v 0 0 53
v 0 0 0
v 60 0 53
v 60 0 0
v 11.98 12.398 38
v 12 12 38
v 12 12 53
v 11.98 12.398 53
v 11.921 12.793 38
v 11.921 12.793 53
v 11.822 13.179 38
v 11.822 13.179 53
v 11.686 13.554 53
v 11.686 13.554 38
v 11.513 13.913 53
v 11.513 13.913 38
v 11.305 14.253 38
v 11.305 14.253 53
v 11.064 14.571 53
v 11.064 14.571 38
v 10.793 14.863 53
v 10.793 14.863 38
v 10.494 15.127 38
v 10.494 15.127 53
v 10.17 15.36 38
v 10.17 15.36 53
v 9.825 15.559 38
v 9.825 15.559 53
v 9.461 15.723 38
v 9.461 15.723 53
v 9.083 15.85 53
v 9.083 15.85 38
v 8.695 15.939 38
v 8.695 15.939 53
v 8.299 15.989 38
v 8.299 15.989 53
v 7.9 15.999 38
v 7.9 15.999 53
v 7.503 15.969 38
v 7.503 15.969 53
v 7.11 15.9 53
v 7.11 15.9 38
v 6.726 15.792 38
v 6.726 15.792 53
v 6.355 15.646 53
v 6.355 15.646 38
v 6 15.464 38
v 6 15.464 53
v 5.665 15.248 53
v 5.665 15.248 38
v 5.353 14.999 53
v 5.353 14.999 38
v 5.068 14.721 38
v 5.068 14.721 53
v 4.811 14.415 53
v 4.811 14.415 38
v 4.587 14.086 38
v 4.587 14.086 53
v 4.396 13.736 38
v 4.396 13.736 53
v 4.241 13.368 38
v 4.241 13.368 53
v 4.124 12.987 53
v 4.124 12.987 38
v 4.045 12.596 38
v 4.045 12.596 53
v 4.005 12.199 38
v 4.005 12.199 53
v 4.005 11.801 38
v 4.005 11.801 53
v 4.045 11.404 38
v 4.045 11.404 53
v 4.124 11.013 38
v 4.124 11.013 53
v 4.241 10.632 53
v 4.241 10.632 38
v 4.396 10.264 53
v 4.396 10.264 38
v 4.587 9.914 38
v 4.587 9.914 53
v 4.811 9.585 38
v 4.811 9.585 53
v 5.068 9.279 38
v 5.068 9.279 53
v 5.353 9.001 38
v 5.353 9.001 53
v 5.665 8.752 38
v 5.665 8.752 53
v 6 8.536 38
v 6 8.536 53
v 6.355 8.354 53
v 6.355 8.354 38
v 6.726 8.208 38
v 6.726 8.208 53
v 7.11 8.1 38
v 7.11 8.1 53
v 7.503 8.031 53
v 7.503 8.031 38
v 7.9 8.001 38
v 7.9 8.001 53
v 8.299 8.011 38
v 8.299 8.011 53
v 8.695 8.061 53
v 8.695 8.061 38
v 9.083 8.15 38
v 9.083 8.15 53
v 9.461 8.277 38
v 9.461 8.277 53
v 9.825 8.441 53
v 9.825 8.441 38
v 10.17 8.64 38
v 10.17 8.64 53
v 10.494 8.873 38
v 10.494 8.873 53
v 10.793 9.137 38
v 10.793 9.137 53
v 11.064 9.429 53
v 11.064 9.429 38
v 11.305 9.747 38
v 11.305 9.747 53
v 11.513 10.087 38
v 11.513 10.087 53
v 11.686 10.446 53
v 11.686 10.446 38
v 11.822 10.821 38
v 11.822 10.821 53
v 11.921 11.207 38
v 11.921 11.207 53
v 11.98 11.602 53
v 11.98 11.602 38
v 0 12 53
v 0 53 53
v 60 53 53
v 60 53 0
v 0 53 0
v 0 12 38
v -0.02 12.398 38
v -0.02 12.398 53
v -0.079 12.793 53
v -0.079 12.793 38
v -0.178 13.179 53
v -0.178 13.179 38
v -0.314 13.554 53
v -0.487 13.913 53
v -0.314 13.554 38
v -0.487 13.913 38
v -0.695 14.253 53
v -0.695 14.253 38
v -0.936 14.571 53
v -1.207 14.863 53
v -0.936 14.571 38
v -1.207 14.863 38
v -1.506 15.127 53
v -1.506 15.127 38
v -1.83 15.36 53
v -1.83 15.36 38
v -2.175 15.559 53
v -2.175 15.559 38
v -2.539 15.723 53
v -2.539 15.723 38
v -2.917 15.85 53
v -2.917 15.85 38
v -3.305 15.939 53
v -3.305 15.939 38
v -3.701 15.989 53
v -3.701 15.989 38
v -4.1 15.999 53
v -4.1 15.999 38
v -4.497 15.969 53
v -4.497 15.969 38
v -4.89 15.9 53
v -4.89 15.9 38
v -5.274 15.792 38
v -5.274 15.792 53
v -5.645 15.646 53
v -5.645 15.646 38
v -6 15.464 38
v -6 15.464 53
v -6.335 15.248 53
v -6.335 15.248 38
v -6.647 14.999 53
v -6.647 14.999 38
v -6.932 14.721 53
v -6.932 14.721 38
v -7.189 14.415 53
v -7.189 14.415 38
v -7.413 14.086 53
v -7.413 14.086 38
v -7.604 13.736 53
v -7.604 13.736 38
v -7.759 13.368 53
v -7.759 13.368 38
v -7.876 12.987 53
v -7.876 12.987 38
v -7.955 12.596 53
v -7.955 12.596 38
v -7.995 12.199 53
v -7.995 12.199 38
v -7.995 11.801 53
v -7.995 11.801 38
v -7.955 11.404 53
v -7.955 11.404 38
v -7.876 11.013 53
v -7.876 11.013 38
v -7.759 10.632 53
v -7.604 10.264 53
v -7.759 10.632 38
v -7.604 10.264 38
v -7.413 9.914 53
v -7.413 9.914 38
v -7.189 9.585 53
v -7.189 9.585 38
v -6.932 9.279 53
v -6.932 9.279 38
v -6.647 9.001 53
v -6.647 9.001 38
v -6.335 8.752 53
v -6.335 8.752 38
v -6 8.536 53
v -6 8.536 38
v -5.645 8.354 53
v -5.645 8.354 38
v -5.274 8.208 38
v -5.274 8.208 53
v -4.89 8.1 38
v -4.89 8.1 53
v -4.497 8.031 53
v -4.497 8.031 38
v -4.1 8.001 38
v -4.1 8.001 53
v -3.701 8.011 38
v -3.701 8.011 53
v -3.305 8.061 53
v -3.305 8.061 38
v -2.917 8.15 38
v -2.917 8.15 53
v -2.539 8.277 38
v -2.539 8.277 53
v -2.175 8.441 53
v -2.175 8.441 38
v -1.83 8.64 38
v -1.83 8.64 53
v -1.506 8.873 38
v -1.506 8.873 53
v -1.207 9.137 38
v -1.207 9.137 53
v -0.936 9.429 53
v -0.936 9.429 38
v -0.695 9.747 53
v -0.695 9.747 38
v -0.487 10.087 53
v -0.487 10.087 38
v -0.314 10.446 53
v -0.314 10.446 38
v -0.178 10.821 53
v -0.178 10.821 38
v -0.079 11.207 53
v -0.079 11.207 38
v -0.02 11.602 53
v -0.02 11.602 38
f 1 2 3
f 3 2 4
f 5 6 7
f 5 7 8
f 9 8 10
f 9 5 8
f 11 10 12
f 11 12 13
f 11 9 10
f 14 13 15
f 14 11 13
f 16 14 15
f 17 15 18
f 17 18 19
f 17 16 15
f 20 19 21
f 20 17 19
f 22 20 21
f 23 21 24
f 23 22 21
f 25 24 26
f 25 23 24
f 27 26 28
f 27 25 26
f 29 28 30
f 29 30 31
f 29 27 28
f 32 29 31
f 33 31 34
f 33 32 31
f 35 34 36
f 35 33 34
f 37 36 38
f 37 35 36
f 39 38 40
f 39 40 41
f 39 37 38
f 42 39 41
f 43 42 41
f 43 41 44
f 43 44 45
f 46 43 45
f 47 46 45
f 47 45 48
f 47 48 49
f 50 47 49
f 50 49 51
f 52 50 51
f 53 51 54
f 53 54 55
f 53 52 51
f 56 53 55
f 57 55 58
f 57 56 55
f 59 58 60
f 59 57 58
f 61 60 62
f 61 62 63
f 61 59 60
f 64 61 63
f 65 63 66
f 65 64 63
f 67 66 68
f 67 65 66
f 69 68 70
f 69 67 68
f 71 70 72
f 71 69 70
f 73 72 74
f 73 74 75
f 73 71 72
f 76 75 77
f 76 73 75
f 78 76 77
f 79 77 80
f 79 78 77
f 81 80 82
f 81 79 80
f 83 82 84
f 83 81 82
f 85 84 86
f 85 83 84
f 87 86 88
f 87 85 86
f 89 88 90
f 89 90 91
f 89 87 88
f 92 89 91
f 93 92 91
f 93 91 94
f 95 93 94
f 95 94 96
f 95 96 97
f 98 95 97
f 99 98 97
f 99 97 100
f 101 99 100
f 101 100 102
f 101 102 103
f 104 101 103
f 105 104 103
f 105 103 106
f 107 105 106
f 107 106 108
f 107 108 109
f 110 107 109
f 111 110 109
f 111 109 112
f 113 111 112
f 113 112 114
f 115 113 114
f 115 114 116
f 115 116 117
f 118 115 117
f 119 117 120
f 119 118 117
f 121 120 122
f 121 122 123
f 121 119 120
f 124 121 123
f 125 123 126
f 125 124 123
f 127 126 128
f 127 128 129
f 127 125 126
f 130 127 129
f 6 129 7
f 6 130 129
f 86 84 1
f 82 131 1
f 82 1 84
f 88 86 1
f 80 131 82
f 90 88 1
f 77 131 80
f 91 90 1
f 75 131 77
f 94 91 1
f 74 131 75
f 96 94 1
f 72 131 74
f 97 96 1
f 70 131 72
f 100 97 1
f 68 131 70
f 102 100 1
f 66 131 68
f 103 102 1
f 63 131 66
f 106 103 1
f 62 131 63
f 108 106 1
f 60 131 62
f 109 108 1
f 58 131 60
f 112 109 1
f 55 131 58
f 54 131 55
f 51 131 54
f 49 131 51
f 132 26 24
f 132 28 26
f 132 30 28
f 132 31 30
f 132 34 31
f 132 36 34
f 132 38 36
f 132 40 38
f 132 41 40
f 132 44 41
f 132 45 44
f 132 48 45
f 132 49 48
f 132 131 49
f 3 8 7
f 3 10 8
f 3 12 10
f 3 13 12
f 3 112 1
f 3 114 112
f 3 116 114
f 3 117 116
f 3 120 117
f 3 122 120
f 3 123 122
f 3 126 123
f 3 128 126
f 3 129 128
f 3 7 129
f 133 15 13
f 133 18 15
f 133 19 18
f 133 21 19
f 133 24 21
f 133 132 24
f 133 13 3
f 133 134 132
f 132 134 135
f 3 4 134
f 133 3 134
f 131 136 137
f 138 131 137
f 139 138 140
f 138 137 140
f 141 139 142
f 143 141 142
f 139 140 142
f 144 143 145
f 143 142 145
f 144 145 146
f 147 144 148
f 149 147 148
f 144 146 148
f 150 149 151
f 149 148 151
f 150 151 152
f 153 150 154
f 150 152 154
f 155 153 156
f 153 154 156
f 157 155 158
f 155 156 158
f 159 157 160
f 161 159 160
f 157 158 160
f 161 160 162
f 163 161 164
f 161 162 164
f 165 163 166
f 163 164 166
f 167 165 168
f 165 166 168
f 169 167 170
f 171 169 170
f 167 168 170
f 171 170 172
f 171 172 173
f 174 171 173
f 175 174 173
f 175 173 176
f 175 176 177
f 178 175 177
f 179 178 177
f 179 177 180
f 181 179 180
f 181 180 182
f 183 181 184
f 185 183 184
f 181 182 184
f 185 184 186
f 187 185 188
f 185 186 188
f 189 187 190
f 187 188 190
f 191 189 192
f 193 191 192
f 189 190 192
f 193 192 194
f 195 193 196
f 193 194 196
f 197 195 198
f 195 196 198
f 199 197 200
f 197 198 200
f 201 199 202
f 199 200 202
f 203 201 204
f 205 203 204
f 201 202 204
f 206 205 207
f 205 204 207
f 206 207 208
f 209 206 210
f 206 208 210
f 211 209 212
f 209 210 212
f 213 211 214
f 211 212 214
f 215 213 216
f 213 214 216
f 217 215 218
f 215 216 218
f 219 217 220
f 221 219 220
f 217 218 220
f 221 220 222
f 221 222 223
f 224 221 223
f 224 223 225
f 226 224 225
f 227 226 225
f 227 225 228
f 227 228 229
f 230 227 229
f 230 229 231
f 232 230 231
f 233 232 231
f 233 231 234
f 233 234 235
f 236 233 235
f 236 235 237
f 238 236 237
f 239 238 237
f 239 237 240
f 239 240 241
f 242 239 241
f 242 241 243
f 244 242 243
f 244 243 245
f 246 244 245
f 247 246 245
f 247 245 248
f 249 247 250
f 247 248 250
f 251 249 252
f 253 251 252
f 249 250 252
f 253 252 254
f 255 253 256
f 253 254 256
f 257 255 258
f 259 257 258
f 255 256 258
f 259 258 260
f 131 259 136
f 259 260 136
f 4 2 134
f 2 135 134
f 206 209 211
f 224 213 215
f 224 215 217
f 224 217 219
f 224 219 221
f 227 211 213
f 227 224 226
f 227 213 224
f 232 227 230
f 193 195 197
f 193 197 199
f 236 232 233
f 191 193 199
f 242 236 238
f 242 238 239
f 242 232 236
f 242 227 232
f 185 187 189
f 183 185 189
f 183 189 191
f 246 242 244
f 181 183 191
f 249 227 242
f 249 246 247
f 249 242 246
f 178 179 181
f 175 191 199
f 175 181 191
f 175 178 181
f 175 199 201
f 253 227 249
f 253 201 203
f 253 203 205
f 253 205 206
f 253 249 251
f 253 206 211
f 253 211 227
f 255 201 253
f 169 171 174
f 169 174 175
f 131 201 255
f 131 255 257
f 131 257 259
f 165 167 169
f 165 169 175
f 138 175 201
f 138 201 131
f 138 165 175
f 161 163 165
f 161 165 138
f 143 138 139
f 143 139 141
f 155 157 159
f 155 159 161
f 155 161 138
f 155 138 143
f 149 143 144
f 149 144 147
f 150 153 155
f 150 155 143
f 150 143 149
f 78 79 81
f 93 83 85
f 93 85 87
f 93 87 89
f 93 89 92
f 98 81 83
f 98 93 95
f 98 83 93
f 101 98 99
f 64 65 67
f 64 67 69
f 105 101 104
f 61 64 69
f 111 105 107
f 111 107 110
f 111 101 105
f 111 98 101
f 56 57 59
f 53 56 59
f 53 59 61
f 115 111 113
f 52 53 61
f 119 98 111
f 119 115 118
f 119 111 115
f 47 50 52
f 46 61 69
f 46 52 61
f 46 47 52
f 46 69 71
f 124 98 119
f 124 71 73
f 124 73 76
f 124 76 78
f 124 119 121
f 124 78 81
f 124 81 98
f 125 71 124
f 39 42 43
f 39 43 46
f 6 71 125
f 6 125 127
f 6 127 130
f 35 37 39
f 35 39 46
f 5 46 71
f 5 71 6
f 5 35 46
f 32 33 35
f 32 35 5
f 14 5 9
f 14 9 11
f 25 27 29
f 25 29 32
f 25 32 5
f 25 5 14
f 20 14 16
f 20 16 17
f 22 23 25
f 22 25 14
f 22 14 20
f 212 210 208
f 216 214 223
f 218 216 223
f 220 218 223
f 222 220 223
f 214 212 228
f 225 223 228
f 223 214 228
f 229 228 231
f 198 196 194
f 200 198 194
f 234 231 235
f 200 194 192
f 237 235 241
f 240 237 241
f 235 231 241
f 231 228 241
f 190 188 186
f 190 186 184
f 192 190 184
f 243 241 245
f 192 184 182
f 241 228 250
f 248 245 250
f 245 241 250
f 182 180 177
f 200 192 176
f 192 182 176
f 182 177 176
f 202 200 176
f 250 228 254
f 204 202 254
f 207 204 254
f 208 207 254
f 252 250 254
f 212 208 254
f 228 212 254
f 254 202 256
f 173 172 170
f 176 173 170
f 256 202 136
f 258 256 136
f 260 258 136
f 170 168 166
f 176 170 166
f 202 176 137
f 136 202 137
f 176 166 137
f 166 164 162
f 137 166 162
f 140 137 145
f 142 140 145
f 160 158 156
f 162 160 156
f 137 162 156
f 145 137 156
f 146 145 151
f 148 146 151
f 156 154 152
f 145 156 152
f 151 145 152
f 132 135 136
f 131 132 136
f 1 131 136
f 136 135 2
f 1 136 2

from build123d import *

# Parameters (mm, degrees)
F0_R     = 4
F1_DEPTH = 53
F3_START = 38
F3_DEPTH = 15
F4_START = 38
F4_DEPTH = 15


with BuildPart() as f1:
    # F0 (on Top) → F1 (new body)
    with BuildSketch(Plane.XY):
        Polygon((0, 12), (0, 0), (60, 0), (60, 53), (0, 53), align=None)
        with Locations((8, 12)):
            Circle(F0_R, mode=Mode.SUBTRACT)
        with Locations((8, 12)):
            Circle(F0_R)
    extrude(amount=F1_DEPTH)

    # F0 (on Top) → F3 (cut)
    with BuildSketch(Plane.XY.offset(F3_START)):
        with Locations((8, 12)):
            Circle(F0_R)
        with Locations((-4, 12)):
            Circle(F0_R)
    extrude(amount=F3_DEPTH, mode=Mode.SUBTRACT)


with BuildPart() as f4:
    # F0 (on Top) → F4 (new body)
    with BuildSketch(Plane.XY.offset(F4_START)):
        with Locations((-4, 12)):
            Circle(F0_R)
    extrude(amount=F4_DEPTH)


solid = Compound([f1.part, f4.part])
